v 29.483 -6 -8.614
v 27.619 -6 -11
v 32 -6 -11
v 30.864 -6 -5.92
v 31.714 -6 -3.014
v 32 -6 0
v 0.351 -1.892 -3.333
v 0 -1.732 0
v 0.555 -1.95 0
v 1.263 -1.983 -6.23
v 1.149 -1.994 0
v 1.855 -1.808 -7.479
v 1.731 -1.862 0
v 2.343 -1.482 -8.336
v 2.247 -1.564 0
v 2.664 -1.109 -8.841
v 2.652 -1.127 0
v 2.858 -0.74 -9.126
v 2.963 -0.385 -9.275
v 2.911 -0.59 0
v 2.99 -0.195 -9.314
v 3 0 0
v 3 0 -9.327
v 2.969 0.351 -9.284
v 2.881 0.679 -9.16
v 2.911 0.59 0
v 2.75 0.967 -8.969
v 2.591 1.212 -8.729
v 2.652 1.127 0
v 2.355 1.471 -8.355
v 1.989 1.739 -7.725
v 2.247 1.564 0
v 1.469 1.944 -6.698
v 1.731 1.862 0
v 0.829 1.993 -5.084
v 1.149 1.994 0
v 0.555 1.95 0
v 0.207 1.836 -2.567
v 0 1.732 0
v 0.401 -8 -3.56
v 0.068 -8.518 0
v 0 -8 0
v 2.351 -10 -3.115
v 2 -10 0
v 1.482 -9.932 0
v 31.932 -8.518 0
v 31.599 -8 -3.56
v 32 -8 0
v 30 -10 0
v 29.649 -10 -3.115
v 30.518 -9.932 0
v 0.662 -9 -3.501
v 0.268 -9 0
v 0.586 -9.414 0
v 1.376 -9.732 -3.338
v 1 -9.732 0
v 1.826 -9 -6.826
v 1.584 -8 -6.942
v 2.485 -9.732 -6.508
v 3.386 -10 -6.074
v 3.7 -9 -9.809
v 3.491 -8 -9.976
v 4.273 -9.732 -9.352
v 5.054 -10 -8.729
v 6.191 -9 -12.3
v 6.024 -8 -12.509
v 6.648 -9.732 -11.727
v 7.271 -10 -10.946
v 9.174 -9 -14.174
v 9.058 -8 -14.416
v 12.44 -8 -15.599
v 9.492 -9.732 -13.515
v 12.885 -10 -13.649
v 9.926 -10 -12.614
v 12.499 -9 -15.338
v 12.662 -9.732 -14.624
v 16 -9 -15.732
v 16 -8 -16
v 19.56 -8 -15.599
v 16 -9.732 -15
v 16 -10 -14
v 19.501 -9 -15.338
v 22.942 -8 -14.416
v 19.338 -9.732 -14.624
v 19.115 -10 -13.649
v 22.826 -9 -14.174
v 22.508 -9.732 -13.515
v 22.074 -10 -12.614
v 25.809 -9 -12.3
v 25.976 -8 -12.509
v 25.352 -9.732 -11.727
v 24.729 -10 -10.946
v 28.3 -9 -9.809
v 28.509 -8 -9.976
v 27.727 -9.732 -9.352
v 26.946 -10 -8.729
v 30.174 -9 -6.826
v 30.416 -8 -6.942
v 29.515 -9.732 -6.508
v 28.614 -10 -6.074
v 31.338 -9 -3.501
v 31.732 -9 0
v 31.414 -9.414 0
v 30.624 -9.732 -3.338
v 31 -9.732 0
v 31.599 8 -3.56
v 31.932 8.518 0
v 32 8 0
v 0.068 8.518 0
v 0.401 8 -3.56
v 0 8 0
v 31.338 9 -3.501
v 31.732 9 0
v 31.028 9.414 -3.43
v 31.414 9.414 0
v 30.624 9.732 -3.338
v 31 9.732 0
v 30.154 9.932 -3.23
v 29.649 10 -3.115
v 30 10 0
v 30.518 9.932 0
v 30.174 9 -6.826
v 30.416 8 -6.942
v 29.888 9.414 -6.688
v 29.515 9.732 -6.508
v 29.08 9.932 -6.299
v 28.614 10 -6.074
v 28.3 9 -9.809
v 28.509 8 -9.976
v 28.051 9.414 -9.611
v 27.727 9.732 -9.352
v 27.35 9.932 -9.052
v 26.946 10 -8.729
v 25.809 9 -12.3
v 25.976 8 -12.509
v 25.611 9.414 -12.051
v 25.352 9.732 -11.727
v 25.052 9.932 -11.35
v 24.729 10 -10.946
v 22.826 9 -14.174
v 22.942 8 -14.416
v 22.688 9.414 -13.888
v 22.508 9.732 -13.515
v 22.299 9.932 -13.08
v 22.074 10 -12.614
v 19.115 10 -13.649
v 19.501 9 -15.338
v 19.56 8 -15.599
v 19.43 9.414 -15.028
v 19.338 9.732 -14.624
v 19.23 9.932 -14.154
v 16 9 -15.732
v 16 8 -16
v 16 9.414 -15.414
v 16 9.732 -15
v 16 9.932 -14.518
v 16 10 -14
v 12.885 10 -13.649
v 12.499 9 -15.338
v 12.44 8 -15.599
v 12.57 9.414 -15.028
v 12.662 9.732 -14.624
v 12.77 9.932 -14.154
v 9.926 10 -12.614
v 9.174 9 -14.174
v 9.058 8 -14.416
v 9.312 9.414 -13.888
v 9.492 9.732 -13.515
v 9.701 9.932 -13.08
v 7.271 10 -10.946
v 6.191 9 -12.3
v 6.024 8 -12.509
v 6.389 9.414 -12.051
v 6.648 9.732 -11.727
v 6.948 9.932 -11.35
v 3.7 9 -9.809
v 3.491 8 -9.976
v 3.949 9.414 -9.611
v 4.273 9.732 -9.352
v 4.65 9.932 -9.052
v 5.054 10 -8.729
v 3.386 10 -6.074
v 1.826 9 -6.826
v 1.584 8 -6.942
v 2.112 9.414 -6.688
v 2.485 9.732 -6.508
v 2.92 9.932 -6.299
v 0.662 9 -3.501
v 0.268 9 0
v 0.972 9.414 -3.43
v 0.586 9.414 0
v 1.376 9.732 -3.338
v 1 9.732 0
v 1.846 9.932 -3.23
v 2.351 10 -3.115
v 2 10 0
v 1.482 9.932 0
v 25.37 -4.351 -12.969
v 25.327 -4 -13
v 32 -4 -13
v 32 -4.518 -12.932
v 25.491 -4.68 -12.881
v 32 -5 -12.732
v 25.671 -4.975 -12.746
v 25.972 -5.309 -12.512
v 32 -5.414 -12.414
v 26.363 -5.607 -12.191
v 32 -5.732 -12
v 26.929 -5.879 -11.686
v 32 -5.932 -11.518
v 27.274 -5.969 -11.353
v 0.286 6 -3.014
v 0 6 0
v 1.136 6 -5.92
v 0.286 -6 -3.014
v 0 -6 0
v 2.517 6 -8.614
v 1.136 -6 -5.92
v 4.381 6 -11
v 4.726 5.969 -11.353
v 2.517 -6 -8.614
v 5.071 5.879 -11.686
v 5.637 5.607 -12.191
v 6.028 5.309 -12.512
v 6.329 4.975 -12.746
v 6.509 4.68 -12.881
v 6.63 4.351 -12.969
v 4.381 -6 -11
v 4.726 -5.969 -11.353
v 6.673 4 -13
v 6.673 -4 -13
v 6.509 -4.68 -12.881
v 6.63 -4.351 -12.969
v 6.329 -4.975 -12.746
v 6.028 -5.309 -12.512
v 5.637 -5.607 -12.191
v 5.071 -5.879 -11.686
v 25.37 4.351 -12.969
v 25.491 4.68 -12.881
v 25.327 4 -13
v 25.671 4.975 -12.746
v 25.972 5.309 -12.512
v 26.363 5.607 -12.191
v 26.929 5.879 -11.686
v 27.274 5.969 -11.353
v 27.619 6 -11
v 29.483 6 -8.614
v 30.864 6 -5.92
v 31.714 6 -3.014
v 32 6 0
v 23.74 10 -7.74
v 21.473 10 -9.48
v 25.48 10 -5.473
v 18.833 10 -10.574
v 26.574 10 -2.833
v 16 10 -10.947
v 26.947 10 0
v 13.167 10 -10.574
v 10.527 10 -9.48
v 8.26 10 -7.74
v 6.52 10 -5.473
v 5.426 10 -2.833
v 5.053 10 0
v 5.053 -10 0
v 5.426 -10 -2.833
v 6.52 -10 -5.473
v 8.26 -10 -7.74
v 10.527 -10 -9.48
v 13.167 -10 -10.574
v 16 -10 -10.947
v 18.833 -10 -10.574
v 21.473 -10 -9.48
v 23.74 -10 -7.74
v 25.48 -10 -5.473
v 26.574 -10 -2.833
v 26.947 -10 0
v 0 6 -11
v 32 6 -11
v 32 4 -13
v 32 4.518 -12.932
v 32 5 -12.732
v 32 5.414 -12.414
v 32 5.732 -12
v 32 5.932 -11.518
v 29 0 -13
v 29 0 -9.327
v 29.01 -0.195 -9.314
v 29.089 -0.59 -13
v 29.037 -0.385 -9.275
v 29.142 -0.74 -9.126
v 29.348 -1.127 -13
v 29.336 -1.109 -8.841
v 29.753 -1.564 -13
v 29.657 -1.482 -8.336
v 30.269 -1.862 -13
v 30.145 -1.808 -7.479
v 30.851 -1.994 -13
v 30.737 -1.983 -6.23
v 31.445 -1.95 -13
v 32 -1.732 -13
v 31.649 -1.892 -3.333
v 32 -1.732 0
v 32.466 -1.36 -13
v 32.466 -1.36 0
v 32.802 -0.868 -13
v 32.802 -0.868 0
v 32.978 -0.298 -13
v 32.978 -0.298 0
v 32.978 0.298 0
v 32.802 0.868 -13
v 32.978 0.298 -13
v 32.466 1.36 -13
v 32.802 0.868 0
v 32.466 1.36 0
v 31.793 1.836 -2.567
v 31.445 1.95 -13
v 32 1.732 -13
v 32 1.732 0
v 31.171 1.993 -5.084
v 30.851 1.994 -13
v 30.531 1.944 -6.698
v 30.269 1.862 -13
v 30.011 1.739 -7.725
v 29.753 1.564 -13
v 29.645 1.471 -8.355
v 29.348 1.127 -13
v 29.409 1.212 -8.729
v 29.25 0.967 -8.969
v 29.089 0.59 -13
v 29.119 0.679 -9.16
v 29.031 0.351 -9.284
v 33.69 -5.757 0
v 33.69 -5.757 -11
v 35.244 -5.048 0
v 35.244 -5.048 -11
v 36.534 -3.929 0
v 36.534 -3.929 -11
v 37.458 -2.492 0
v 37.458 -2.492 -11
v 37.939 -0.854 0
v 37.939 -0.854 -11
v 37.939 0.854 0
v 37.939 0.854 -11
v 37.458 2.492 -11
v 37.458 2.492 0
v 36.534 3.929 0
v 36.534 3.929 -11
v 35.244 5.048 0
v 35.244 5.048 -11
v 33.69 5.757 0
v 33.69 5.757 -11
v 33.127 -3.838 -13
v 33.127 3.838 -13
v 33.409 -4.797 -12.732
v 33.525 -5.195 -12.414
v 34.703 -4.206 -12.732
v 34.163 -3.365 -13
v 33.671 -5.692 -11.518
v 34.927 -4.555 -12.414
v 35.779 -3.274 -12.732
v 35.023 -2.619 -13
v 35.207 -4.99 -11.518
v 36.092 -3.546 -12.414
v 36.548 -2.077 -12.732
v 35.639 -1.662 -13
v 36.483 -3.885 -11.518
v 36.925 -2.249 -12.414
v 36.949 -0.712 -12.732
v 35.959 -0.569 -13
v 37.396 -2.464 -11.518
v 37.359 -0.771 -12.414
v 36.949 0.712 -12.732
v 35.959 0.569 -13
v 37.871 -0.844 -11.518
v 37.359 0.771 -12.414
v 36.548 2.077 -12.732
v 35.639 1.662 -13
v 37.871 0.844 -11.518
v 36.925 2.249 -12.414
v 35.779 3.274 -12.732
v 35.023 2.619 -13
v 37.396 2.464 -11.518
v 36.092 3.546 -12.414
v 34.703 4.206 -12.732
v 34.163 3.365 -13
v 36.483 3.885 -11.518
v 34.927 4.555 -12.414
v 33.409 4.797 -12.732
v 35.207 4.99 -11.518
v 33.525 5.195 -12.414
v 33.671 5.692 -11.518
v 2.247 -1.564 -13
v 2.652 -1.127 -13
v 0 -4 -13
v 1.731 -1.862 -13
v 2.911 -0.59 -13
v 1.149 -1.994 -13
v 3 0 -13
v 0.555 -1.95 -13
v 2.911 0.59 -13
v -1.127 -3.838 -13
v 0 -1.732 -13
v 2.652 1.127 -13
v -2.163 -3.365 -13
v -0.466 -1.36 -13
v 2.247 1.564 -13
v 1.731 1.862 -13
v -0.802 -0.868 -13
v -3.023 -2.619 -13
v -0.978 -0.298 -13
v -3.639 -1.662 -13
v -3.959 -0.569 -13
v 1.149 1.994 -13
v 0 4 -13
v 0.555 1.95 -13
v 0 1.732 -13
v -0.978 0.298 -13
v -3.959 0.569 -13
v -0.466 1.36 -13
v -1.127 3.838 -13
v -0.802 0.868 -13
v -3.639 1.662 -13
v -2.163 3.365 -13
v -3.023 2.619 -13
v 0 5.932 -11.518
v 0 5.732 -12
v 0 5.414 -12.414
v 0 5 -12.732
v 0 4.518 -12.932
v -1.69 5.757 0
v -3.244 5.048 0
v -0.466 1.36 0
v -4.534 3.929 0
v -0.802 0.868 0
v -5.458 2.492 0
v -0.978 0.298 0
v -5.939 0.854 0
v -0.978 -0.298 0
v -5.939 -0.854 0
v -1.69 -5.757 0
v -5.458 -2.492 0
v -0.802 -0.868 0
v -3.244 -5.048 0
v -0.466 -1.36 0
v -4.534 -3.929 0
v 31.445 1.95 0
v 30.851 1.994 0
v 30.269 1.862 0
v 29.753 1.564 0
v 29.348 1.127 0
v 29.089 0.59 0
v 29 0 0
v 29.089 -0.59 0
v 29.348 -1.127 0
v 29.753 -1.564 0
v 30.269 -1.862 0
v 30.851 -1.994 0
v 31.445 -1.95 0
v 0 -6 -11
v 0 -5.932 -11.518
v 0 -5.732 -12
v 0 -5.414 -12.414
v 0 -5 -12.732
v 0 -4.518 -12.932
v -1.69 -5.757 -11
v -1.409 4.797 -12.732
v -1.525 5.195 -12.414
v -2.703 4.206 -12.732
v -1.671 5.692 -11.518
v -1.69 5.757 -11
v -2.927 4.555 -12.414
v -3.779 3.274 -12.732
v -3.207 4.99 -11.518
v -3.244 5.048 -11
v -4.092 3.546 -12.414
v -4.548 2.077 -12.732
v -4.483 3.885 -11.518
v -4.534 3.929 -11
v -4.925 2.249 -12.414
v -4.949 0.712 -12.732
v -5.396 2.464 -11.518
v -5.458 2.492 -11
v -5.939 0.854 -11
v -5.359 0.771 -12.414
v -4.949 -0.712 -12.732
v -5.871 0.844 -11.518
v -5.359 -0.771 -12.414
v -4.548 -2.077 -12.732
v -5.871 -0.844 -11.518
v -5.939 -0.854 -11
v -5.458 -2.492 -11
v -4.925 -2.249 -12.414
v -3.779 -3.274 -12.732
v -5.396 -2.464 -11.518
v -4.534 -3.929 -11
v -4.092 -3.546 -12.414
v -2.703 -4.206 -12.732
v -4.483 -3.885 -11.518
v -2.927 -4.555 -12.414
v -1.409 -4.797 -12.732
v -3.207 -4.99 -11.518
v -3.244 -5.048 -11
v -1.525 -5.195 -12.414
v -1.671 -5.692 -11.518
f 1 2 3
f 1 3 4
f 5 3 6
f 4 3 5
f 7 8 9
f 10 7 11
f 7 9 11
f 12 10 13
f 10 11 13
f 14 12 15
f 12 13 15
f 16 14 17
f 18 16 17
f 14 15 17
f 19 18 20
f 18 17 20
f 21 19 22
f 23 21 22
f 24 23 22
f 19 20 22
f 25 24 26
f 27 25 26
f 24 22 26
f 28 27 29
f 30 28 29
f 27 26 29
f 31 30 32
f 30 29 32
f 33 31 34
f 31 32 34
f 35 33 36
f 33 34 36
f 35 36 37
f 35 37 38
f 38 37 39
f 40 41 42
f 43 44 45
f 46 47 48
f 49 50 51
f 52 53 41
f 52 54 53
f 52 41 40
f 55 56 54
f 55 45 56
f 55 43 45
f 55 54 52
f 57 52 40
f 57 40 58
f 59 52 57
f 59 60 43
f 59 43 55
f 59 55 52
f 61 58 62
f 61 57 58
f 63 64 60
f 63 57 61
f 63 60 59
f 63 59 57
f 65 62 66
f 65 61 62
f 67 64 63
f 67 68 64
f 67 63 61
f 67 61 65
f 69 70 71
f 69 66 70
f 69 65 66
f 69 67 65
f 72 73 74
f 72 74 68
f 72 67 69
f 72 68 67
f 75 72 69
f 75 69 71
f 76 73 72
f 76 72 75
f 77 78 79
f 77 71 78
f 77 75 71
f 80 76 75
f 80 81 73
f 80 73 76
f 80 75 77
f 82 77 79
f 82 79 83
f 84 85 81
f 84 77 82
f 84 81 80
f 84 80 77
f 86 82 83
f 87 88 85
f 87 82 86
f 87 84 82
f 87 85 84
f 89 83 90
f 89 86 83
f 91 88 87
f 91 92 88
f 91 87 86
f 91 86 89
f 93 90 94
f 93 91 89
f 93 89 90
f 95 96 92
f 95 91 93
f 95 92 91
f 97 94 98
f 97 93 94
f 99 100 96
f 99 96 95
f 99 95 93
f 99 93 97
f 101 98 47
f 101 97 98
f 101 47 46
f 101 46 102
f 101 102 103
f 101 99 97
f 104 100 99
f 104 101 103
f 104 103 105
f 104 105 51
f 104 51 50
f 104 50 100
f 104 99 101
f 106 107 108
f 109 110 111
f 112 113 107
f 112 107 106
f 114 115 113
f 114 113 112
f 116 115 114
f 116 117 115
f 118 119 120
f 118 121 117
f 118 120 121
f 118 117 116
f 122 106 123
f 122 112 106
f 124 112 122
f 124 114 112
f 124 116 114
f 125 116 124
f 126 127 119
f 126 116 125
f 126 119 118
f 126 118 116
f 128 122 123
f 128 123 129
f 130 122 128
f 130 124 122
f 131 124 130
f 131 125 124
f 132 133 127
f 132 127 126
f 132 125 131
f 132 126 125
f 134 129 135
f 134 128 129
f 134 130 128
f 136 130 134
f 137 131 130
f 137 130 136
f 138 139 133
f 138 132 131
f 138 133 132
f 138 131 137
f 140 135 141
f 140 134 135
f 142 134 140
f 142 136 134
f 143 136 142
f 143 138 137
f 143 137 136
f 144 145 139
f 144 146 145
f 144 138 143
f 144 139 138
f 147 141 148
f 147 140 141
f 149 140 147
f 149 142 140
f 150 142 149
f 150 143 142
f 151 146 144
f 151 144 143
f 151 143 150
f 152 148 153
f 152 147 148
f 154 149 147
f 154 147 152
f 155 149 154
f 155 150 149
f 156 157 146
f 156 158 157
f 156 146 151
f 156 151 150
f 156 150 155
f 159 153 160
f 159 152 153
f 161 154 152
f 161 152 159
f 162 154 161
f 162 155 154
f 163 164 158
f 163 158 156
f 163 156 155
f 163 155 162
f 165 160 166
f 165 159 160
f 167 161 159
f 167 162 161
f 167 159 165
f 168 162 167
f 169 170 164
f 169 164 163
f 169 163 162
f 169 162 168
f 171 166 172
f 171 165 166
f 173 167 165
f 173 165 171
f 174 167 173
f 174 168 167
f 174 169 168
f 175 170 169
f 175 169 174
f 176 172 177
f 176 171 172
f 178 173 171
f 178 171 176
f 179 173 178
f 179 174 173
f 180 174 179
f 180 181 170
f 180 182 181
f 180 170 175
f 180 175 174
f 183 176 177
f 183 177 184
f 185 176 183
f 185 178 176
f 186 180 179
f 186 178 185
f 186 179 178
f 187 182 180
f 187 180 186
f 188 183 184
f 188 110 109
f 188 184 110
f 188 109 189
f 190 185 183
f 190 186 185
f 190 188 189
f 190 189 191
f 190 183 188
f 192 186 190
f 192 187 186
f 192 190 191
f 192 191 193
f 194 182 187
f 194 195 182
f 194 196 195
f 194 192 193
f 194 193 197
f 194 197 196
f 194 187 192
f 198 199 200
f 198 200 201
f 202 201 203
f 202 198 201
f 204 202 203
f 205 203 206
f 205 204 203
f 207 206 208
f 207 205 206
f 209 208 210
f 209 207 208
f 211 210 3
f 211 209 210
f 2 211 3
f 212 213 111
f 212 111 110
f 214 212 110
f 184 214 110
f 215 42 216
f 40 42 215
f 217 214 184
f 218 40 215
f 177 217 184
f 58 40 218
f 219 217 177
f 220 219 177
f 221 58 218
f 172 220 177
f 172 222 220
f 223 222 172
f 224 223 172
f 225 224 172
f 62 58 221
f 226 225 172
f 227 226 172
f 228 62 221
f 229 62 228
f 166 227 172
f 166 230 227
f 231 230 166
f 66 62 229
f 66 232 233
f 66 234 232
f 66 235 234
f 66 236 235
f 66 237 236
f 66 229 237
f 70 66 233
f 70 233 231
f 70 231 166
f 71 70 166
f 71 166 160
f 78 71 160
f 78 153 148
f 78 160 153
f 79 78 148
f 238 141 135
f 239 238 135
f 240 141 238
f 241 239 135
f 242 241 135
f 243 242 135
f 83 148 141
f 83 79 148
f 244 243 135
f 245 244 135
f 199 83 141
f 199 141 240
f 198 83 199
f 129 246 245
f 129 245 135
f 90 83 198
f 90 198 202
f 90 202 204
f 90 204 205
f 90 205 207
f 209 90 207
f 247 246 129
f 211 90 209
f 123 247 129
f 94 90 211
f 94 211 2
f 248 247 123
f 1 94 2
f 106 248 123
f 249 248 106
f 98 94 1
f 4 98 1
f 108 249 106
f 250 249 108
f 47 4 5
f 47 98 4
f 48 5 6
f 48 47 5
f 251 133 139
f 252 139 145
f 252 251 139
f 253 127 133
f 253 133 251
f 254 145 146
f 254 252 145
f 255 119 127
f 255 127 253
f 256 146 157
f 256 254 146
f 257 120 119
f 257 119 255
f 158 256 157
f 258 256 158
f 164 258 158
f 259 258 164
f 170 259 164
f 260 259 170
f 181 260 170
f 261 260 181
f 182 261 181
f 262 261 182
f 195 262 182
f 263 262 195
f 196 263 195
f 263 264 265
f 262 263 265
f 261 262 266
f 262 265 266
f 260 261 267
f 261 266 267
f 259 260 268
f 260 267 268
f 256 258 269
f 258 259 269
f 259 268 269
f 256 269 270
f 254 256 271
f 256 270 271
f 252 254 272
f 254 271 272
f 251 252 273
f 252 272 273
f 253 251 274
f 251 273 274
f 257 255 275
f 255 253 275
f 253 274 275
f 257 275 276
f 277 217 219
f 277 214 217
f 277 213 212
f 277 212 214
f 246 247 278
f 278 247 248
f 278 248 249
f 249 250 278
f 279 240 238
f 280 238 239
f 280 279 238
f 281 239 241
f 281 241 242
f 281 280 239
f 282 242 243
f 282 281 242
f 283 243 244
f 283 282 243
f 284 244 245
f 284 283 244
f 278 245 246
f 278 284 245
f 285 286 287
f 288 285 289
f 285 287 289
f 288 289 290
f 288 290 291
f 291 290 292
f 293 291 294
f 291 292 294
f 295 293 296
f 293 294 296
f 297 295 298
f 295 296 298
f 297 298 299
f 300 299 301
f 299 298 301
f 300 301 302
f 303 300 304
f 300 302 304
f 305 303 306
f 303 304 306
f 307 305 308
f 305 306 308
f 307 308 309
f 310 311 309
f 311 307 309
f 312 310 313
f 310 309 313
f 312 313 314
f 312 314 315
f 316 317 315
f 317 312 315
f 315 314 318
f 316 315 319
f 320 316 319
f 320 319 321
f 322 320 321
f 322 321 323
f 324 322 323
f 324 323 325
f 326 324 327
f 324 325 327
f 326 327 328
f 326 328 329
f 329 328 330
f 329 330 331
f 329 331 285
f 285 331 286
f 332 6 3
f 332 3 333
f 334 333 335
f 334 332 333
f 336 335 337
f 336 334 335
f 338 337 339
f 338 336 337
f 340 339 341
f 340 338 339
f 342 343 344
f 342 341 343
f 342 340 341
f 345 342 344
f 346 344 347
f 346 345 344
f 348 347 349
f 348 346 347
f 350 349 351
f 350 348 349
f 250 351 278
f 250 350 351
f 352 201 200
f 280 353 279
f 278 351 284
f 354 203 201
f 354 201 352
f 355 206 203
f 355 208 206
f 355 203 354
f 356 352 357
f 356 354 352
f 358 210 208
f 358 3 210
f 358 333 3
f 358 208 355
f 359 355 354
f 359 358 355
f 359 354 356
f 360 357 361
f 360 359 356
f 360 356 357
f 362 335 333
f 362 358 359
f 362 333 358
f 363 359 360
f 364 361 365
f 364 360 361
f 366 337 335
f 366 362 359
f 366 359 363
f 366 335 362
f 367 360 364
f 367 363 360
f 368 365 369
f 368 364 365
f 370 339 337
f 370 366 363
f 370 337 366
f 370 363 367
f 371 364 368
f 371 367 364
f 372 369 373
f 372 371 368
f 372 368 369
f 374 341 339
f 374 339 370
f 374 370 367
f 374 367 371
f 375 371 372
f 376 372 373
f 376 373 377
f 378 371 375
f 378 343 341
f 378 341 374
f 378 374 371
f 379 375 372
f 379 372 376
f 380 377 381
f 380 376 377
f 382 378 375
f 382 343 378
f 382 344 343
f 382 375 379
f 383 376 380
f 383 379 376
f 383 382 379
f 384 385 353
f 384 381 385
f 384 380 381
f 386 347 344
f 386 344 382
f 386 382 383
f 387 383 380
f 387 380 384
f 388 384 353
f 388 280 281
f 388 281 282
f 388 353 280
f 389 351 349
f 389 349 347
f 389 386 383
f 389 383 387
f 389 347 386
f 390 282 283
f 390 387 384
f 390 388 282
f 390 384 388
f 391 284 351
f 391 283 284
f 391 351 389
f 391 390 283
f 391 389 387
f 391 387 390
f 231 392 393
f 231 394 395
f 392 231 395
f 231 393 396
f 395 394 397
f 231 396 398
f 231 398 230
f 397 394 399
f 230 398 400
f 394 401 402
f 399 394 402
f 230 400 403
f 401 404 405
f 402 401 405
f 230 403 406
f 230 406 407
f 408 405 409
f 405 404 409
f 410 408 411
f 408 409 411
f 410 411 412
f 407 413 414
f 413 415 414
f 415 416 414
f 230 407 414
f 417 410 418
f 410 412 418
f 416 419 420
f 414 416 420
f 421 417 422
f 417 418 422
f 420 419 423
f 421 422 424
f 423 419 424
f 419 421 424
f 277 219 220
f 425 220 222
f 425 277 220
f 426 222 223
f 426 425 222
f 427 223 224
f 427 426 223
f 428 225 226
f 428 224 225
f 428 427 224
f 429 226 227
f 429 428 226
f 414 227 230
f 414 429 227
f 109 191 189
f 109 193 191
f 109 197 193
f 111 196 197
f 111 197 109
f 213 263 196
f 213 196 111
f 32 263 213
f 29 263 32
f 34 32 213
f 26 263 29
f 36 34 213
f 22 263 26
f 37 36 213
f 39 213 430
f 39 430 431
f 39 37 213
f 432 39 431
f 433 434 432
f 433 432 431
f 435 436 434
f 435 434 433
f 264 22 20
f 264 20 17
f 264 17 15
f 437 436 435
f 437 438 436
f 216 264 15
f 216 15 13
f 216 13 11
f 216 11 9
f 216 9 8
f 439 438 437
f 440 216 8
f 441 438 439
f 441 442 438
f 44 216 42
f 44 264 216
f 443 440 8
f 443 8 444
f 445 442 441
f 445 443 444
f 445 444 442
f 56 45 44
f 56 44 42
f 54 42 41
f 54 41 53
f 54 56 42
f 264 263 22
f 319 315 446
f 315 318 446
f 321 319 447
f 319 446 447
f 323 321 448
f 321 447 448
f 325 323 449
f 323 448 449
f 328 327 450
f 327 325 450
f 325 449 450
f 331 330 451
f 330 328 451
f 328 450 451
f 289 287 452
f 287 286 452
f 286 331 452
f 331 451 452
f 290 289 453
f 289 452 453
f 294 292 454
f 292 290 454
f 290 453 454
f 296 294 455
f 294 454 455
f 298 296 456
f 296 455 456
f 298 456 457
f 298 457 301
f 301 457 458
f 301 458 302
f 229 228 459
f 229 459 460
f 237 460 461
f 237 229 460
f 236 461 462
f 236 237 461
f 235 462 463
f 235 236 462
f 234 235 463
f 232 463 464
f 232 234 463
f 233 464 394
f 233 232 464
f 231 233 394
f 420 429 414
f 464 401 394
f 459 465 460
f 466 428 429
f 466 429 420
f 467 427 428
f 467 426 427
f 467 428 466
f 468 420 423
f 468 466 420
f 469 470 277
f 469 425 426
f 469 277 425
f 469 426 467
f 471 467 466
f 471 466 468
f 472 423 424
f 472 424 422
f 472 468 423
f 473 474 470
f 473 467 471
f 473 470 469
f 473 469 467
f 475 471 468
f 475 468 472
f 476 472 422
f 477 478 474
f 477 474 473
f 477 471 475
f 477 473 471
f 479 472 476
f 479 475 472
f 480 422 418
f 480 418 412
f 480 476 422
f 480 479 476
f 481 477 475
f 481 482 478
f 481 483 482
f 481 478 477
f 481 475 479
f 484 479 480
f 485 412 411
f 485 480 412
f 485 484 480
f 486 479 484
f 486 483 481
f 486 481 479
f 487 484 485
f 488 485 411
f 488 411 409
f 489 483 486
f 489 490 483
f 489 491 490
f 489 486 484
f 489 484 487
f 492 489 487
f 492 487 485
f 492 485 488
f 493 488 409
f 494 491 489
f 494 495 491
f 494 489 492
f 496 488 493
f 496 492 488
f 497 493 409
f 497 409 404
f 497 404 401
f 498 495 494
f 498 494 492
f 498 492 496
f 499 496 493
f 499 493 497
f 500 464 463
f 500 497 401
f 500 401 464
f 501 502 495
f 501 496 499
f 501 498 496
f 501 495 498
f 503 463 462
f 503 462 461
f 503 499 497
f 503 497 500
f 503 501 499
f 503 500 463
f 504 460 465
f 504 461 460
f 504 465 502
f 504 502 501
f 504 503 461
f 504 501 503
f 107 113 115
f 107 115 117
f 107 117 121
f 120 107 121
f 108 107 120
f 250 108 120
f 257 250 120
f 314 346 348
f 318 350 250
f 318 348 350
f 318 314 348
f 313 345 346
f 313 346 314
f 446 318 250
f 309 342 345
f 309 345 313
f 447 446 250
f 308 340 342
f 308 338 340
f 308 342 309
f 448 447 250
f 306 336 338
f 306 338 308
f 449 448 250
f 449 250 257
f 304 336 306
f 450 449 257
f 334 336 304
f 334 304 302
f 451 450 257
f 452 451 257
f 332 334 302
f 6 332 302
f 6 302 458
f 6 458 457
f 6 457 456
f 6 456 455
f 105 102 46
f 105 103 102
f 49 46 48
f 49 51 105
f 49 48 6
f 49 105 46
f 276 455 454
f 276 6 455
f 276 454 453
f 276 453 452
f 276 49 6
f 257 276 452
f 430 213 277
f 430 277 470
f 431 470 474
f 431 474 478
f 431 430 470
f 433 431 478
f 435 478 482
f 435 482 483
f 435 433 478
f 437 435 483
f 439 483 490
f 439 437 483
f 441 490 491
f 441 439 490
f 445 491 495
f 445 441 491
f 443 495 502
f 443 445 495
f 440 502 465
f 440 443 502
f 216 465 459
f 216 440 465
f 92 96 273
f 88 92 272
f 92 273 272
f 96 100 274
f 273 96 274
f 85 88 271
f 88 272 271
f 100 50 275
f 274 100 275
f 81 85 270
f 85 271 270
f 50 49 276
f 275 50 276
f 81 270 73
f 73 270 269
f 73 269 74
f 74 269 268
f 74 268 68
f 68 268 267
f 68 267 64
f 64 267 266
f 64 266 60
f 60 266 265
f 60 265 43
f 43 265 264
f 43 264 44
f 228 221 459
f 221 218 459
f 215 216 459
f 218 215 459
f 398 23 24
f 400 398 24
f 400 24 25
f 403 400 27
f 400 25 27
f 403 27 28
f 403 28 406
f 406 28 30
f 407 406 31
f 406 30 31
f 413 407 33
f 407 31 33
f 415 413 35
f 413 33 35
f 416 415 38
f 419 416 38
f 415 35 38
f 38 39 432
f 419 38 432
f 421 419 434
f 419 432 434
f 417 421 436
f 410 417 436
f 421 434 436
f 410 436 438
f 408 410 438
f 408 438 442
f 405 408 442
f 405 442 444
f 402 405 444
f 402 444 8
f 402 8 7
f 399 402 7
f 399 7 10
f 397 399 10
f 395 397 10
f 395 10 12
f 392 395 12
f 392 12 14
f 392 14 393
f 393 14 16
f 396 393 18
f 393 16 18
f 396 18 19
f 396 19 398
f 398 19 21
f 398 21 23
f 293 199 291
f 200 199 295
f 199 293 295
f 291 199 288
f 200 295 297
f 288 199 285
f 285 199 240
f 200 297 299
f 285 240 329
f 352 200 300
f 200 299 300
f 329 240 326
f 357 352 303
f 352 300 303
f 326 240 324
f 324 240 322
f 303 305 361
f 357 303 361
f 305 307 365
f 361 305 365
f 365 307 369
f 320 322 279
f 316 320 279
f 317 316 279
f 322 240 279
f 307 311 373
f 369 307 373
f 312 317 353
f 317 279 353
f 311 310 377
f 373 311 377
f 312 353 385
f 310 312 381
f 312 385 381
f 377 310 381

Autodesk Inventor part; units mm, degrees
ref_plane "YZ Plane" through (0, 0, 0) normal (1, 0, 0) x (0, 1, 0)
ref_plane "XZ Plane" through (0, 0, 0) normal (0, 1, 0) x (-1, 0, 0)
sketch "Sketch1" plane through (0, 0, 0) normal (0, 0, 1) x (1, 0, 0)
  arc A0 (3.8592, 10.1235) -> (3.8, 10.125) centre (3.8, 8.925) ccw construction
  line L0 (1.2, 10.125) -> (3.8, 10.125) construction
  arc A1 (1.2, 10.125) -> (0, 8.925) centre (1.2, 8.925) ccw construction
  line L1 (0, 6) -> (0, 8.925) construction
  arc A2 (0, 6) -> (0, -6) centre (0, 0) ccw
  line L2 (0, -8.925) -> (0, -6) construction
  arc A3 (0, -8.925) -> (1.2, -10.125) centre (1.2, -8.925) ccw construction
  line L3 (1.2, -10.125) -> (3.8, -10.125) construction
  arc A4 (3.8, -10.125) -> (3.8592, -10.1235) centre (3.8, -8.925) ccw construction
  line L4 (3.8592, 10.1235) -> (3.8592, -10.1235) construction
  circle A5 centre (1, 0) radius 2
  arc A6 (28.2, 10.125) -> (28.1408, 10.1235) centre (28.2, 8.925) ccw
  line L5 (28.1408, -10.1235) -> (28.1408, 10.1235)
  arc A7 (28.1408, -10.1235) -> (28.2, -10.125) centre (28.2, -8.925) ccw
  line L6 (28.2, -10.125) -> (30.8, -10.125)
  arc A8 (30.8, -10.125) -> (32, -8.925) centre (30.8, -8.925) ccw
  line L7 (32, -8.925) -> (32, -6)
  arc A9 (32, -6) -> (32, 6) centre (32, 0) ccw
  line L8 (32, 6) -> (32, 8.925)
  arc A10 (32, 8.925) -> (30.8, 10.125) centre (30.8, 8.925) ccw
  line L9 (28.2, 10.125) -> (30.8, 10.125)
  circle A11 centre (31, 0) radius 2
  line L10 (5.0533, -8.925) -> (5.0533, 8.925) construction
  line L11 (26.9467, 8.925) -> (26.9467, -8.925)
  line L12 (0, -6) -> (3.8592, -6)
  line L13 (0, 6) -> (3.8592, 6)
  line L14 (3.8592, -6) -> (3.8592, 6)
  point P0 (25.5, -25.375)
sketch "Sketch2" plane through (0, 0, 0) normal (0, 1, 0) x (-1, 0, 0)
  arc A0 (-26.9467, 0) -> (-5.0533, 0) centre (-16, 0) ccw
  arc A1 (-32, 0) -> (0, 0) centre (-16, 0) ccw
  line L0 (-28.1408, 0) -> (-26.9467, 0)
  line L1 (-5.0533, 0) -> (-3.8592, 0)
  line L2 (0, 0) -> (-5.0533, 0)
  line L3 (-26.9467, 0) -> (-32, 0)
  point P0 (-26.9467, 0)
extrude "Extrusion1" add sketch "Sketch2" along normal mid plane 20
extrude "Extrusion2" add sketch "Sketch1" against normal blind 13 contours L13 L14 L12 A2
sketch "Sketch3" plane through (3.8592, -6, -10.4211) normal (1, 0, 0) x (0, 0, -1)
  line L0 (0, 0) -> (0, 12) projected
  line L1 (0, 0) -> (2.5789, 0) projected
  line L2 (2.5789, 0) -> (2.5789, 12) projected
  line L3 (0, 12) -> (2.5789, 12) projected
  point P0 (-10.4211, 6)
extrude "Extrusion3" add sketch "Sketch3" along normal blind 5
ref_plane "Work Plane3" through (16, 10, 0) normal (-1, 0, 0) x (0, -1, 0)
ref_plane "Work Plane1" through (0, 10, 0) normal (-1, 0, 0) x (0, -1, 0)
ref_plane "Work Plane2" through (32, 10, 0) normal (-1, 0, 0) x (0, -1, 0)
mirror "Mirror1" about plane through (16, 10, 0) normal (-1, 0, 0) of "Extrusion3", "Extrusion2"
extrude "Extrusion4" cut sketch "Sketch1" against normal through all contours A5
mirror "Mirror2" about plane through (16, 10, 0) normal (-1, 0, 0) of "Extrusion4"
fillet "Fillet1" radius 2 8 edges at (3.3363, -6, -13) (3.3363, 6, -13) (-6, 0, -13) (28.6637, -6, -13) (28.6637, 6, -13) (38, 0, -13) (16, 10, -16) (16, -10, -16)
properties part number "Abrazadera"
